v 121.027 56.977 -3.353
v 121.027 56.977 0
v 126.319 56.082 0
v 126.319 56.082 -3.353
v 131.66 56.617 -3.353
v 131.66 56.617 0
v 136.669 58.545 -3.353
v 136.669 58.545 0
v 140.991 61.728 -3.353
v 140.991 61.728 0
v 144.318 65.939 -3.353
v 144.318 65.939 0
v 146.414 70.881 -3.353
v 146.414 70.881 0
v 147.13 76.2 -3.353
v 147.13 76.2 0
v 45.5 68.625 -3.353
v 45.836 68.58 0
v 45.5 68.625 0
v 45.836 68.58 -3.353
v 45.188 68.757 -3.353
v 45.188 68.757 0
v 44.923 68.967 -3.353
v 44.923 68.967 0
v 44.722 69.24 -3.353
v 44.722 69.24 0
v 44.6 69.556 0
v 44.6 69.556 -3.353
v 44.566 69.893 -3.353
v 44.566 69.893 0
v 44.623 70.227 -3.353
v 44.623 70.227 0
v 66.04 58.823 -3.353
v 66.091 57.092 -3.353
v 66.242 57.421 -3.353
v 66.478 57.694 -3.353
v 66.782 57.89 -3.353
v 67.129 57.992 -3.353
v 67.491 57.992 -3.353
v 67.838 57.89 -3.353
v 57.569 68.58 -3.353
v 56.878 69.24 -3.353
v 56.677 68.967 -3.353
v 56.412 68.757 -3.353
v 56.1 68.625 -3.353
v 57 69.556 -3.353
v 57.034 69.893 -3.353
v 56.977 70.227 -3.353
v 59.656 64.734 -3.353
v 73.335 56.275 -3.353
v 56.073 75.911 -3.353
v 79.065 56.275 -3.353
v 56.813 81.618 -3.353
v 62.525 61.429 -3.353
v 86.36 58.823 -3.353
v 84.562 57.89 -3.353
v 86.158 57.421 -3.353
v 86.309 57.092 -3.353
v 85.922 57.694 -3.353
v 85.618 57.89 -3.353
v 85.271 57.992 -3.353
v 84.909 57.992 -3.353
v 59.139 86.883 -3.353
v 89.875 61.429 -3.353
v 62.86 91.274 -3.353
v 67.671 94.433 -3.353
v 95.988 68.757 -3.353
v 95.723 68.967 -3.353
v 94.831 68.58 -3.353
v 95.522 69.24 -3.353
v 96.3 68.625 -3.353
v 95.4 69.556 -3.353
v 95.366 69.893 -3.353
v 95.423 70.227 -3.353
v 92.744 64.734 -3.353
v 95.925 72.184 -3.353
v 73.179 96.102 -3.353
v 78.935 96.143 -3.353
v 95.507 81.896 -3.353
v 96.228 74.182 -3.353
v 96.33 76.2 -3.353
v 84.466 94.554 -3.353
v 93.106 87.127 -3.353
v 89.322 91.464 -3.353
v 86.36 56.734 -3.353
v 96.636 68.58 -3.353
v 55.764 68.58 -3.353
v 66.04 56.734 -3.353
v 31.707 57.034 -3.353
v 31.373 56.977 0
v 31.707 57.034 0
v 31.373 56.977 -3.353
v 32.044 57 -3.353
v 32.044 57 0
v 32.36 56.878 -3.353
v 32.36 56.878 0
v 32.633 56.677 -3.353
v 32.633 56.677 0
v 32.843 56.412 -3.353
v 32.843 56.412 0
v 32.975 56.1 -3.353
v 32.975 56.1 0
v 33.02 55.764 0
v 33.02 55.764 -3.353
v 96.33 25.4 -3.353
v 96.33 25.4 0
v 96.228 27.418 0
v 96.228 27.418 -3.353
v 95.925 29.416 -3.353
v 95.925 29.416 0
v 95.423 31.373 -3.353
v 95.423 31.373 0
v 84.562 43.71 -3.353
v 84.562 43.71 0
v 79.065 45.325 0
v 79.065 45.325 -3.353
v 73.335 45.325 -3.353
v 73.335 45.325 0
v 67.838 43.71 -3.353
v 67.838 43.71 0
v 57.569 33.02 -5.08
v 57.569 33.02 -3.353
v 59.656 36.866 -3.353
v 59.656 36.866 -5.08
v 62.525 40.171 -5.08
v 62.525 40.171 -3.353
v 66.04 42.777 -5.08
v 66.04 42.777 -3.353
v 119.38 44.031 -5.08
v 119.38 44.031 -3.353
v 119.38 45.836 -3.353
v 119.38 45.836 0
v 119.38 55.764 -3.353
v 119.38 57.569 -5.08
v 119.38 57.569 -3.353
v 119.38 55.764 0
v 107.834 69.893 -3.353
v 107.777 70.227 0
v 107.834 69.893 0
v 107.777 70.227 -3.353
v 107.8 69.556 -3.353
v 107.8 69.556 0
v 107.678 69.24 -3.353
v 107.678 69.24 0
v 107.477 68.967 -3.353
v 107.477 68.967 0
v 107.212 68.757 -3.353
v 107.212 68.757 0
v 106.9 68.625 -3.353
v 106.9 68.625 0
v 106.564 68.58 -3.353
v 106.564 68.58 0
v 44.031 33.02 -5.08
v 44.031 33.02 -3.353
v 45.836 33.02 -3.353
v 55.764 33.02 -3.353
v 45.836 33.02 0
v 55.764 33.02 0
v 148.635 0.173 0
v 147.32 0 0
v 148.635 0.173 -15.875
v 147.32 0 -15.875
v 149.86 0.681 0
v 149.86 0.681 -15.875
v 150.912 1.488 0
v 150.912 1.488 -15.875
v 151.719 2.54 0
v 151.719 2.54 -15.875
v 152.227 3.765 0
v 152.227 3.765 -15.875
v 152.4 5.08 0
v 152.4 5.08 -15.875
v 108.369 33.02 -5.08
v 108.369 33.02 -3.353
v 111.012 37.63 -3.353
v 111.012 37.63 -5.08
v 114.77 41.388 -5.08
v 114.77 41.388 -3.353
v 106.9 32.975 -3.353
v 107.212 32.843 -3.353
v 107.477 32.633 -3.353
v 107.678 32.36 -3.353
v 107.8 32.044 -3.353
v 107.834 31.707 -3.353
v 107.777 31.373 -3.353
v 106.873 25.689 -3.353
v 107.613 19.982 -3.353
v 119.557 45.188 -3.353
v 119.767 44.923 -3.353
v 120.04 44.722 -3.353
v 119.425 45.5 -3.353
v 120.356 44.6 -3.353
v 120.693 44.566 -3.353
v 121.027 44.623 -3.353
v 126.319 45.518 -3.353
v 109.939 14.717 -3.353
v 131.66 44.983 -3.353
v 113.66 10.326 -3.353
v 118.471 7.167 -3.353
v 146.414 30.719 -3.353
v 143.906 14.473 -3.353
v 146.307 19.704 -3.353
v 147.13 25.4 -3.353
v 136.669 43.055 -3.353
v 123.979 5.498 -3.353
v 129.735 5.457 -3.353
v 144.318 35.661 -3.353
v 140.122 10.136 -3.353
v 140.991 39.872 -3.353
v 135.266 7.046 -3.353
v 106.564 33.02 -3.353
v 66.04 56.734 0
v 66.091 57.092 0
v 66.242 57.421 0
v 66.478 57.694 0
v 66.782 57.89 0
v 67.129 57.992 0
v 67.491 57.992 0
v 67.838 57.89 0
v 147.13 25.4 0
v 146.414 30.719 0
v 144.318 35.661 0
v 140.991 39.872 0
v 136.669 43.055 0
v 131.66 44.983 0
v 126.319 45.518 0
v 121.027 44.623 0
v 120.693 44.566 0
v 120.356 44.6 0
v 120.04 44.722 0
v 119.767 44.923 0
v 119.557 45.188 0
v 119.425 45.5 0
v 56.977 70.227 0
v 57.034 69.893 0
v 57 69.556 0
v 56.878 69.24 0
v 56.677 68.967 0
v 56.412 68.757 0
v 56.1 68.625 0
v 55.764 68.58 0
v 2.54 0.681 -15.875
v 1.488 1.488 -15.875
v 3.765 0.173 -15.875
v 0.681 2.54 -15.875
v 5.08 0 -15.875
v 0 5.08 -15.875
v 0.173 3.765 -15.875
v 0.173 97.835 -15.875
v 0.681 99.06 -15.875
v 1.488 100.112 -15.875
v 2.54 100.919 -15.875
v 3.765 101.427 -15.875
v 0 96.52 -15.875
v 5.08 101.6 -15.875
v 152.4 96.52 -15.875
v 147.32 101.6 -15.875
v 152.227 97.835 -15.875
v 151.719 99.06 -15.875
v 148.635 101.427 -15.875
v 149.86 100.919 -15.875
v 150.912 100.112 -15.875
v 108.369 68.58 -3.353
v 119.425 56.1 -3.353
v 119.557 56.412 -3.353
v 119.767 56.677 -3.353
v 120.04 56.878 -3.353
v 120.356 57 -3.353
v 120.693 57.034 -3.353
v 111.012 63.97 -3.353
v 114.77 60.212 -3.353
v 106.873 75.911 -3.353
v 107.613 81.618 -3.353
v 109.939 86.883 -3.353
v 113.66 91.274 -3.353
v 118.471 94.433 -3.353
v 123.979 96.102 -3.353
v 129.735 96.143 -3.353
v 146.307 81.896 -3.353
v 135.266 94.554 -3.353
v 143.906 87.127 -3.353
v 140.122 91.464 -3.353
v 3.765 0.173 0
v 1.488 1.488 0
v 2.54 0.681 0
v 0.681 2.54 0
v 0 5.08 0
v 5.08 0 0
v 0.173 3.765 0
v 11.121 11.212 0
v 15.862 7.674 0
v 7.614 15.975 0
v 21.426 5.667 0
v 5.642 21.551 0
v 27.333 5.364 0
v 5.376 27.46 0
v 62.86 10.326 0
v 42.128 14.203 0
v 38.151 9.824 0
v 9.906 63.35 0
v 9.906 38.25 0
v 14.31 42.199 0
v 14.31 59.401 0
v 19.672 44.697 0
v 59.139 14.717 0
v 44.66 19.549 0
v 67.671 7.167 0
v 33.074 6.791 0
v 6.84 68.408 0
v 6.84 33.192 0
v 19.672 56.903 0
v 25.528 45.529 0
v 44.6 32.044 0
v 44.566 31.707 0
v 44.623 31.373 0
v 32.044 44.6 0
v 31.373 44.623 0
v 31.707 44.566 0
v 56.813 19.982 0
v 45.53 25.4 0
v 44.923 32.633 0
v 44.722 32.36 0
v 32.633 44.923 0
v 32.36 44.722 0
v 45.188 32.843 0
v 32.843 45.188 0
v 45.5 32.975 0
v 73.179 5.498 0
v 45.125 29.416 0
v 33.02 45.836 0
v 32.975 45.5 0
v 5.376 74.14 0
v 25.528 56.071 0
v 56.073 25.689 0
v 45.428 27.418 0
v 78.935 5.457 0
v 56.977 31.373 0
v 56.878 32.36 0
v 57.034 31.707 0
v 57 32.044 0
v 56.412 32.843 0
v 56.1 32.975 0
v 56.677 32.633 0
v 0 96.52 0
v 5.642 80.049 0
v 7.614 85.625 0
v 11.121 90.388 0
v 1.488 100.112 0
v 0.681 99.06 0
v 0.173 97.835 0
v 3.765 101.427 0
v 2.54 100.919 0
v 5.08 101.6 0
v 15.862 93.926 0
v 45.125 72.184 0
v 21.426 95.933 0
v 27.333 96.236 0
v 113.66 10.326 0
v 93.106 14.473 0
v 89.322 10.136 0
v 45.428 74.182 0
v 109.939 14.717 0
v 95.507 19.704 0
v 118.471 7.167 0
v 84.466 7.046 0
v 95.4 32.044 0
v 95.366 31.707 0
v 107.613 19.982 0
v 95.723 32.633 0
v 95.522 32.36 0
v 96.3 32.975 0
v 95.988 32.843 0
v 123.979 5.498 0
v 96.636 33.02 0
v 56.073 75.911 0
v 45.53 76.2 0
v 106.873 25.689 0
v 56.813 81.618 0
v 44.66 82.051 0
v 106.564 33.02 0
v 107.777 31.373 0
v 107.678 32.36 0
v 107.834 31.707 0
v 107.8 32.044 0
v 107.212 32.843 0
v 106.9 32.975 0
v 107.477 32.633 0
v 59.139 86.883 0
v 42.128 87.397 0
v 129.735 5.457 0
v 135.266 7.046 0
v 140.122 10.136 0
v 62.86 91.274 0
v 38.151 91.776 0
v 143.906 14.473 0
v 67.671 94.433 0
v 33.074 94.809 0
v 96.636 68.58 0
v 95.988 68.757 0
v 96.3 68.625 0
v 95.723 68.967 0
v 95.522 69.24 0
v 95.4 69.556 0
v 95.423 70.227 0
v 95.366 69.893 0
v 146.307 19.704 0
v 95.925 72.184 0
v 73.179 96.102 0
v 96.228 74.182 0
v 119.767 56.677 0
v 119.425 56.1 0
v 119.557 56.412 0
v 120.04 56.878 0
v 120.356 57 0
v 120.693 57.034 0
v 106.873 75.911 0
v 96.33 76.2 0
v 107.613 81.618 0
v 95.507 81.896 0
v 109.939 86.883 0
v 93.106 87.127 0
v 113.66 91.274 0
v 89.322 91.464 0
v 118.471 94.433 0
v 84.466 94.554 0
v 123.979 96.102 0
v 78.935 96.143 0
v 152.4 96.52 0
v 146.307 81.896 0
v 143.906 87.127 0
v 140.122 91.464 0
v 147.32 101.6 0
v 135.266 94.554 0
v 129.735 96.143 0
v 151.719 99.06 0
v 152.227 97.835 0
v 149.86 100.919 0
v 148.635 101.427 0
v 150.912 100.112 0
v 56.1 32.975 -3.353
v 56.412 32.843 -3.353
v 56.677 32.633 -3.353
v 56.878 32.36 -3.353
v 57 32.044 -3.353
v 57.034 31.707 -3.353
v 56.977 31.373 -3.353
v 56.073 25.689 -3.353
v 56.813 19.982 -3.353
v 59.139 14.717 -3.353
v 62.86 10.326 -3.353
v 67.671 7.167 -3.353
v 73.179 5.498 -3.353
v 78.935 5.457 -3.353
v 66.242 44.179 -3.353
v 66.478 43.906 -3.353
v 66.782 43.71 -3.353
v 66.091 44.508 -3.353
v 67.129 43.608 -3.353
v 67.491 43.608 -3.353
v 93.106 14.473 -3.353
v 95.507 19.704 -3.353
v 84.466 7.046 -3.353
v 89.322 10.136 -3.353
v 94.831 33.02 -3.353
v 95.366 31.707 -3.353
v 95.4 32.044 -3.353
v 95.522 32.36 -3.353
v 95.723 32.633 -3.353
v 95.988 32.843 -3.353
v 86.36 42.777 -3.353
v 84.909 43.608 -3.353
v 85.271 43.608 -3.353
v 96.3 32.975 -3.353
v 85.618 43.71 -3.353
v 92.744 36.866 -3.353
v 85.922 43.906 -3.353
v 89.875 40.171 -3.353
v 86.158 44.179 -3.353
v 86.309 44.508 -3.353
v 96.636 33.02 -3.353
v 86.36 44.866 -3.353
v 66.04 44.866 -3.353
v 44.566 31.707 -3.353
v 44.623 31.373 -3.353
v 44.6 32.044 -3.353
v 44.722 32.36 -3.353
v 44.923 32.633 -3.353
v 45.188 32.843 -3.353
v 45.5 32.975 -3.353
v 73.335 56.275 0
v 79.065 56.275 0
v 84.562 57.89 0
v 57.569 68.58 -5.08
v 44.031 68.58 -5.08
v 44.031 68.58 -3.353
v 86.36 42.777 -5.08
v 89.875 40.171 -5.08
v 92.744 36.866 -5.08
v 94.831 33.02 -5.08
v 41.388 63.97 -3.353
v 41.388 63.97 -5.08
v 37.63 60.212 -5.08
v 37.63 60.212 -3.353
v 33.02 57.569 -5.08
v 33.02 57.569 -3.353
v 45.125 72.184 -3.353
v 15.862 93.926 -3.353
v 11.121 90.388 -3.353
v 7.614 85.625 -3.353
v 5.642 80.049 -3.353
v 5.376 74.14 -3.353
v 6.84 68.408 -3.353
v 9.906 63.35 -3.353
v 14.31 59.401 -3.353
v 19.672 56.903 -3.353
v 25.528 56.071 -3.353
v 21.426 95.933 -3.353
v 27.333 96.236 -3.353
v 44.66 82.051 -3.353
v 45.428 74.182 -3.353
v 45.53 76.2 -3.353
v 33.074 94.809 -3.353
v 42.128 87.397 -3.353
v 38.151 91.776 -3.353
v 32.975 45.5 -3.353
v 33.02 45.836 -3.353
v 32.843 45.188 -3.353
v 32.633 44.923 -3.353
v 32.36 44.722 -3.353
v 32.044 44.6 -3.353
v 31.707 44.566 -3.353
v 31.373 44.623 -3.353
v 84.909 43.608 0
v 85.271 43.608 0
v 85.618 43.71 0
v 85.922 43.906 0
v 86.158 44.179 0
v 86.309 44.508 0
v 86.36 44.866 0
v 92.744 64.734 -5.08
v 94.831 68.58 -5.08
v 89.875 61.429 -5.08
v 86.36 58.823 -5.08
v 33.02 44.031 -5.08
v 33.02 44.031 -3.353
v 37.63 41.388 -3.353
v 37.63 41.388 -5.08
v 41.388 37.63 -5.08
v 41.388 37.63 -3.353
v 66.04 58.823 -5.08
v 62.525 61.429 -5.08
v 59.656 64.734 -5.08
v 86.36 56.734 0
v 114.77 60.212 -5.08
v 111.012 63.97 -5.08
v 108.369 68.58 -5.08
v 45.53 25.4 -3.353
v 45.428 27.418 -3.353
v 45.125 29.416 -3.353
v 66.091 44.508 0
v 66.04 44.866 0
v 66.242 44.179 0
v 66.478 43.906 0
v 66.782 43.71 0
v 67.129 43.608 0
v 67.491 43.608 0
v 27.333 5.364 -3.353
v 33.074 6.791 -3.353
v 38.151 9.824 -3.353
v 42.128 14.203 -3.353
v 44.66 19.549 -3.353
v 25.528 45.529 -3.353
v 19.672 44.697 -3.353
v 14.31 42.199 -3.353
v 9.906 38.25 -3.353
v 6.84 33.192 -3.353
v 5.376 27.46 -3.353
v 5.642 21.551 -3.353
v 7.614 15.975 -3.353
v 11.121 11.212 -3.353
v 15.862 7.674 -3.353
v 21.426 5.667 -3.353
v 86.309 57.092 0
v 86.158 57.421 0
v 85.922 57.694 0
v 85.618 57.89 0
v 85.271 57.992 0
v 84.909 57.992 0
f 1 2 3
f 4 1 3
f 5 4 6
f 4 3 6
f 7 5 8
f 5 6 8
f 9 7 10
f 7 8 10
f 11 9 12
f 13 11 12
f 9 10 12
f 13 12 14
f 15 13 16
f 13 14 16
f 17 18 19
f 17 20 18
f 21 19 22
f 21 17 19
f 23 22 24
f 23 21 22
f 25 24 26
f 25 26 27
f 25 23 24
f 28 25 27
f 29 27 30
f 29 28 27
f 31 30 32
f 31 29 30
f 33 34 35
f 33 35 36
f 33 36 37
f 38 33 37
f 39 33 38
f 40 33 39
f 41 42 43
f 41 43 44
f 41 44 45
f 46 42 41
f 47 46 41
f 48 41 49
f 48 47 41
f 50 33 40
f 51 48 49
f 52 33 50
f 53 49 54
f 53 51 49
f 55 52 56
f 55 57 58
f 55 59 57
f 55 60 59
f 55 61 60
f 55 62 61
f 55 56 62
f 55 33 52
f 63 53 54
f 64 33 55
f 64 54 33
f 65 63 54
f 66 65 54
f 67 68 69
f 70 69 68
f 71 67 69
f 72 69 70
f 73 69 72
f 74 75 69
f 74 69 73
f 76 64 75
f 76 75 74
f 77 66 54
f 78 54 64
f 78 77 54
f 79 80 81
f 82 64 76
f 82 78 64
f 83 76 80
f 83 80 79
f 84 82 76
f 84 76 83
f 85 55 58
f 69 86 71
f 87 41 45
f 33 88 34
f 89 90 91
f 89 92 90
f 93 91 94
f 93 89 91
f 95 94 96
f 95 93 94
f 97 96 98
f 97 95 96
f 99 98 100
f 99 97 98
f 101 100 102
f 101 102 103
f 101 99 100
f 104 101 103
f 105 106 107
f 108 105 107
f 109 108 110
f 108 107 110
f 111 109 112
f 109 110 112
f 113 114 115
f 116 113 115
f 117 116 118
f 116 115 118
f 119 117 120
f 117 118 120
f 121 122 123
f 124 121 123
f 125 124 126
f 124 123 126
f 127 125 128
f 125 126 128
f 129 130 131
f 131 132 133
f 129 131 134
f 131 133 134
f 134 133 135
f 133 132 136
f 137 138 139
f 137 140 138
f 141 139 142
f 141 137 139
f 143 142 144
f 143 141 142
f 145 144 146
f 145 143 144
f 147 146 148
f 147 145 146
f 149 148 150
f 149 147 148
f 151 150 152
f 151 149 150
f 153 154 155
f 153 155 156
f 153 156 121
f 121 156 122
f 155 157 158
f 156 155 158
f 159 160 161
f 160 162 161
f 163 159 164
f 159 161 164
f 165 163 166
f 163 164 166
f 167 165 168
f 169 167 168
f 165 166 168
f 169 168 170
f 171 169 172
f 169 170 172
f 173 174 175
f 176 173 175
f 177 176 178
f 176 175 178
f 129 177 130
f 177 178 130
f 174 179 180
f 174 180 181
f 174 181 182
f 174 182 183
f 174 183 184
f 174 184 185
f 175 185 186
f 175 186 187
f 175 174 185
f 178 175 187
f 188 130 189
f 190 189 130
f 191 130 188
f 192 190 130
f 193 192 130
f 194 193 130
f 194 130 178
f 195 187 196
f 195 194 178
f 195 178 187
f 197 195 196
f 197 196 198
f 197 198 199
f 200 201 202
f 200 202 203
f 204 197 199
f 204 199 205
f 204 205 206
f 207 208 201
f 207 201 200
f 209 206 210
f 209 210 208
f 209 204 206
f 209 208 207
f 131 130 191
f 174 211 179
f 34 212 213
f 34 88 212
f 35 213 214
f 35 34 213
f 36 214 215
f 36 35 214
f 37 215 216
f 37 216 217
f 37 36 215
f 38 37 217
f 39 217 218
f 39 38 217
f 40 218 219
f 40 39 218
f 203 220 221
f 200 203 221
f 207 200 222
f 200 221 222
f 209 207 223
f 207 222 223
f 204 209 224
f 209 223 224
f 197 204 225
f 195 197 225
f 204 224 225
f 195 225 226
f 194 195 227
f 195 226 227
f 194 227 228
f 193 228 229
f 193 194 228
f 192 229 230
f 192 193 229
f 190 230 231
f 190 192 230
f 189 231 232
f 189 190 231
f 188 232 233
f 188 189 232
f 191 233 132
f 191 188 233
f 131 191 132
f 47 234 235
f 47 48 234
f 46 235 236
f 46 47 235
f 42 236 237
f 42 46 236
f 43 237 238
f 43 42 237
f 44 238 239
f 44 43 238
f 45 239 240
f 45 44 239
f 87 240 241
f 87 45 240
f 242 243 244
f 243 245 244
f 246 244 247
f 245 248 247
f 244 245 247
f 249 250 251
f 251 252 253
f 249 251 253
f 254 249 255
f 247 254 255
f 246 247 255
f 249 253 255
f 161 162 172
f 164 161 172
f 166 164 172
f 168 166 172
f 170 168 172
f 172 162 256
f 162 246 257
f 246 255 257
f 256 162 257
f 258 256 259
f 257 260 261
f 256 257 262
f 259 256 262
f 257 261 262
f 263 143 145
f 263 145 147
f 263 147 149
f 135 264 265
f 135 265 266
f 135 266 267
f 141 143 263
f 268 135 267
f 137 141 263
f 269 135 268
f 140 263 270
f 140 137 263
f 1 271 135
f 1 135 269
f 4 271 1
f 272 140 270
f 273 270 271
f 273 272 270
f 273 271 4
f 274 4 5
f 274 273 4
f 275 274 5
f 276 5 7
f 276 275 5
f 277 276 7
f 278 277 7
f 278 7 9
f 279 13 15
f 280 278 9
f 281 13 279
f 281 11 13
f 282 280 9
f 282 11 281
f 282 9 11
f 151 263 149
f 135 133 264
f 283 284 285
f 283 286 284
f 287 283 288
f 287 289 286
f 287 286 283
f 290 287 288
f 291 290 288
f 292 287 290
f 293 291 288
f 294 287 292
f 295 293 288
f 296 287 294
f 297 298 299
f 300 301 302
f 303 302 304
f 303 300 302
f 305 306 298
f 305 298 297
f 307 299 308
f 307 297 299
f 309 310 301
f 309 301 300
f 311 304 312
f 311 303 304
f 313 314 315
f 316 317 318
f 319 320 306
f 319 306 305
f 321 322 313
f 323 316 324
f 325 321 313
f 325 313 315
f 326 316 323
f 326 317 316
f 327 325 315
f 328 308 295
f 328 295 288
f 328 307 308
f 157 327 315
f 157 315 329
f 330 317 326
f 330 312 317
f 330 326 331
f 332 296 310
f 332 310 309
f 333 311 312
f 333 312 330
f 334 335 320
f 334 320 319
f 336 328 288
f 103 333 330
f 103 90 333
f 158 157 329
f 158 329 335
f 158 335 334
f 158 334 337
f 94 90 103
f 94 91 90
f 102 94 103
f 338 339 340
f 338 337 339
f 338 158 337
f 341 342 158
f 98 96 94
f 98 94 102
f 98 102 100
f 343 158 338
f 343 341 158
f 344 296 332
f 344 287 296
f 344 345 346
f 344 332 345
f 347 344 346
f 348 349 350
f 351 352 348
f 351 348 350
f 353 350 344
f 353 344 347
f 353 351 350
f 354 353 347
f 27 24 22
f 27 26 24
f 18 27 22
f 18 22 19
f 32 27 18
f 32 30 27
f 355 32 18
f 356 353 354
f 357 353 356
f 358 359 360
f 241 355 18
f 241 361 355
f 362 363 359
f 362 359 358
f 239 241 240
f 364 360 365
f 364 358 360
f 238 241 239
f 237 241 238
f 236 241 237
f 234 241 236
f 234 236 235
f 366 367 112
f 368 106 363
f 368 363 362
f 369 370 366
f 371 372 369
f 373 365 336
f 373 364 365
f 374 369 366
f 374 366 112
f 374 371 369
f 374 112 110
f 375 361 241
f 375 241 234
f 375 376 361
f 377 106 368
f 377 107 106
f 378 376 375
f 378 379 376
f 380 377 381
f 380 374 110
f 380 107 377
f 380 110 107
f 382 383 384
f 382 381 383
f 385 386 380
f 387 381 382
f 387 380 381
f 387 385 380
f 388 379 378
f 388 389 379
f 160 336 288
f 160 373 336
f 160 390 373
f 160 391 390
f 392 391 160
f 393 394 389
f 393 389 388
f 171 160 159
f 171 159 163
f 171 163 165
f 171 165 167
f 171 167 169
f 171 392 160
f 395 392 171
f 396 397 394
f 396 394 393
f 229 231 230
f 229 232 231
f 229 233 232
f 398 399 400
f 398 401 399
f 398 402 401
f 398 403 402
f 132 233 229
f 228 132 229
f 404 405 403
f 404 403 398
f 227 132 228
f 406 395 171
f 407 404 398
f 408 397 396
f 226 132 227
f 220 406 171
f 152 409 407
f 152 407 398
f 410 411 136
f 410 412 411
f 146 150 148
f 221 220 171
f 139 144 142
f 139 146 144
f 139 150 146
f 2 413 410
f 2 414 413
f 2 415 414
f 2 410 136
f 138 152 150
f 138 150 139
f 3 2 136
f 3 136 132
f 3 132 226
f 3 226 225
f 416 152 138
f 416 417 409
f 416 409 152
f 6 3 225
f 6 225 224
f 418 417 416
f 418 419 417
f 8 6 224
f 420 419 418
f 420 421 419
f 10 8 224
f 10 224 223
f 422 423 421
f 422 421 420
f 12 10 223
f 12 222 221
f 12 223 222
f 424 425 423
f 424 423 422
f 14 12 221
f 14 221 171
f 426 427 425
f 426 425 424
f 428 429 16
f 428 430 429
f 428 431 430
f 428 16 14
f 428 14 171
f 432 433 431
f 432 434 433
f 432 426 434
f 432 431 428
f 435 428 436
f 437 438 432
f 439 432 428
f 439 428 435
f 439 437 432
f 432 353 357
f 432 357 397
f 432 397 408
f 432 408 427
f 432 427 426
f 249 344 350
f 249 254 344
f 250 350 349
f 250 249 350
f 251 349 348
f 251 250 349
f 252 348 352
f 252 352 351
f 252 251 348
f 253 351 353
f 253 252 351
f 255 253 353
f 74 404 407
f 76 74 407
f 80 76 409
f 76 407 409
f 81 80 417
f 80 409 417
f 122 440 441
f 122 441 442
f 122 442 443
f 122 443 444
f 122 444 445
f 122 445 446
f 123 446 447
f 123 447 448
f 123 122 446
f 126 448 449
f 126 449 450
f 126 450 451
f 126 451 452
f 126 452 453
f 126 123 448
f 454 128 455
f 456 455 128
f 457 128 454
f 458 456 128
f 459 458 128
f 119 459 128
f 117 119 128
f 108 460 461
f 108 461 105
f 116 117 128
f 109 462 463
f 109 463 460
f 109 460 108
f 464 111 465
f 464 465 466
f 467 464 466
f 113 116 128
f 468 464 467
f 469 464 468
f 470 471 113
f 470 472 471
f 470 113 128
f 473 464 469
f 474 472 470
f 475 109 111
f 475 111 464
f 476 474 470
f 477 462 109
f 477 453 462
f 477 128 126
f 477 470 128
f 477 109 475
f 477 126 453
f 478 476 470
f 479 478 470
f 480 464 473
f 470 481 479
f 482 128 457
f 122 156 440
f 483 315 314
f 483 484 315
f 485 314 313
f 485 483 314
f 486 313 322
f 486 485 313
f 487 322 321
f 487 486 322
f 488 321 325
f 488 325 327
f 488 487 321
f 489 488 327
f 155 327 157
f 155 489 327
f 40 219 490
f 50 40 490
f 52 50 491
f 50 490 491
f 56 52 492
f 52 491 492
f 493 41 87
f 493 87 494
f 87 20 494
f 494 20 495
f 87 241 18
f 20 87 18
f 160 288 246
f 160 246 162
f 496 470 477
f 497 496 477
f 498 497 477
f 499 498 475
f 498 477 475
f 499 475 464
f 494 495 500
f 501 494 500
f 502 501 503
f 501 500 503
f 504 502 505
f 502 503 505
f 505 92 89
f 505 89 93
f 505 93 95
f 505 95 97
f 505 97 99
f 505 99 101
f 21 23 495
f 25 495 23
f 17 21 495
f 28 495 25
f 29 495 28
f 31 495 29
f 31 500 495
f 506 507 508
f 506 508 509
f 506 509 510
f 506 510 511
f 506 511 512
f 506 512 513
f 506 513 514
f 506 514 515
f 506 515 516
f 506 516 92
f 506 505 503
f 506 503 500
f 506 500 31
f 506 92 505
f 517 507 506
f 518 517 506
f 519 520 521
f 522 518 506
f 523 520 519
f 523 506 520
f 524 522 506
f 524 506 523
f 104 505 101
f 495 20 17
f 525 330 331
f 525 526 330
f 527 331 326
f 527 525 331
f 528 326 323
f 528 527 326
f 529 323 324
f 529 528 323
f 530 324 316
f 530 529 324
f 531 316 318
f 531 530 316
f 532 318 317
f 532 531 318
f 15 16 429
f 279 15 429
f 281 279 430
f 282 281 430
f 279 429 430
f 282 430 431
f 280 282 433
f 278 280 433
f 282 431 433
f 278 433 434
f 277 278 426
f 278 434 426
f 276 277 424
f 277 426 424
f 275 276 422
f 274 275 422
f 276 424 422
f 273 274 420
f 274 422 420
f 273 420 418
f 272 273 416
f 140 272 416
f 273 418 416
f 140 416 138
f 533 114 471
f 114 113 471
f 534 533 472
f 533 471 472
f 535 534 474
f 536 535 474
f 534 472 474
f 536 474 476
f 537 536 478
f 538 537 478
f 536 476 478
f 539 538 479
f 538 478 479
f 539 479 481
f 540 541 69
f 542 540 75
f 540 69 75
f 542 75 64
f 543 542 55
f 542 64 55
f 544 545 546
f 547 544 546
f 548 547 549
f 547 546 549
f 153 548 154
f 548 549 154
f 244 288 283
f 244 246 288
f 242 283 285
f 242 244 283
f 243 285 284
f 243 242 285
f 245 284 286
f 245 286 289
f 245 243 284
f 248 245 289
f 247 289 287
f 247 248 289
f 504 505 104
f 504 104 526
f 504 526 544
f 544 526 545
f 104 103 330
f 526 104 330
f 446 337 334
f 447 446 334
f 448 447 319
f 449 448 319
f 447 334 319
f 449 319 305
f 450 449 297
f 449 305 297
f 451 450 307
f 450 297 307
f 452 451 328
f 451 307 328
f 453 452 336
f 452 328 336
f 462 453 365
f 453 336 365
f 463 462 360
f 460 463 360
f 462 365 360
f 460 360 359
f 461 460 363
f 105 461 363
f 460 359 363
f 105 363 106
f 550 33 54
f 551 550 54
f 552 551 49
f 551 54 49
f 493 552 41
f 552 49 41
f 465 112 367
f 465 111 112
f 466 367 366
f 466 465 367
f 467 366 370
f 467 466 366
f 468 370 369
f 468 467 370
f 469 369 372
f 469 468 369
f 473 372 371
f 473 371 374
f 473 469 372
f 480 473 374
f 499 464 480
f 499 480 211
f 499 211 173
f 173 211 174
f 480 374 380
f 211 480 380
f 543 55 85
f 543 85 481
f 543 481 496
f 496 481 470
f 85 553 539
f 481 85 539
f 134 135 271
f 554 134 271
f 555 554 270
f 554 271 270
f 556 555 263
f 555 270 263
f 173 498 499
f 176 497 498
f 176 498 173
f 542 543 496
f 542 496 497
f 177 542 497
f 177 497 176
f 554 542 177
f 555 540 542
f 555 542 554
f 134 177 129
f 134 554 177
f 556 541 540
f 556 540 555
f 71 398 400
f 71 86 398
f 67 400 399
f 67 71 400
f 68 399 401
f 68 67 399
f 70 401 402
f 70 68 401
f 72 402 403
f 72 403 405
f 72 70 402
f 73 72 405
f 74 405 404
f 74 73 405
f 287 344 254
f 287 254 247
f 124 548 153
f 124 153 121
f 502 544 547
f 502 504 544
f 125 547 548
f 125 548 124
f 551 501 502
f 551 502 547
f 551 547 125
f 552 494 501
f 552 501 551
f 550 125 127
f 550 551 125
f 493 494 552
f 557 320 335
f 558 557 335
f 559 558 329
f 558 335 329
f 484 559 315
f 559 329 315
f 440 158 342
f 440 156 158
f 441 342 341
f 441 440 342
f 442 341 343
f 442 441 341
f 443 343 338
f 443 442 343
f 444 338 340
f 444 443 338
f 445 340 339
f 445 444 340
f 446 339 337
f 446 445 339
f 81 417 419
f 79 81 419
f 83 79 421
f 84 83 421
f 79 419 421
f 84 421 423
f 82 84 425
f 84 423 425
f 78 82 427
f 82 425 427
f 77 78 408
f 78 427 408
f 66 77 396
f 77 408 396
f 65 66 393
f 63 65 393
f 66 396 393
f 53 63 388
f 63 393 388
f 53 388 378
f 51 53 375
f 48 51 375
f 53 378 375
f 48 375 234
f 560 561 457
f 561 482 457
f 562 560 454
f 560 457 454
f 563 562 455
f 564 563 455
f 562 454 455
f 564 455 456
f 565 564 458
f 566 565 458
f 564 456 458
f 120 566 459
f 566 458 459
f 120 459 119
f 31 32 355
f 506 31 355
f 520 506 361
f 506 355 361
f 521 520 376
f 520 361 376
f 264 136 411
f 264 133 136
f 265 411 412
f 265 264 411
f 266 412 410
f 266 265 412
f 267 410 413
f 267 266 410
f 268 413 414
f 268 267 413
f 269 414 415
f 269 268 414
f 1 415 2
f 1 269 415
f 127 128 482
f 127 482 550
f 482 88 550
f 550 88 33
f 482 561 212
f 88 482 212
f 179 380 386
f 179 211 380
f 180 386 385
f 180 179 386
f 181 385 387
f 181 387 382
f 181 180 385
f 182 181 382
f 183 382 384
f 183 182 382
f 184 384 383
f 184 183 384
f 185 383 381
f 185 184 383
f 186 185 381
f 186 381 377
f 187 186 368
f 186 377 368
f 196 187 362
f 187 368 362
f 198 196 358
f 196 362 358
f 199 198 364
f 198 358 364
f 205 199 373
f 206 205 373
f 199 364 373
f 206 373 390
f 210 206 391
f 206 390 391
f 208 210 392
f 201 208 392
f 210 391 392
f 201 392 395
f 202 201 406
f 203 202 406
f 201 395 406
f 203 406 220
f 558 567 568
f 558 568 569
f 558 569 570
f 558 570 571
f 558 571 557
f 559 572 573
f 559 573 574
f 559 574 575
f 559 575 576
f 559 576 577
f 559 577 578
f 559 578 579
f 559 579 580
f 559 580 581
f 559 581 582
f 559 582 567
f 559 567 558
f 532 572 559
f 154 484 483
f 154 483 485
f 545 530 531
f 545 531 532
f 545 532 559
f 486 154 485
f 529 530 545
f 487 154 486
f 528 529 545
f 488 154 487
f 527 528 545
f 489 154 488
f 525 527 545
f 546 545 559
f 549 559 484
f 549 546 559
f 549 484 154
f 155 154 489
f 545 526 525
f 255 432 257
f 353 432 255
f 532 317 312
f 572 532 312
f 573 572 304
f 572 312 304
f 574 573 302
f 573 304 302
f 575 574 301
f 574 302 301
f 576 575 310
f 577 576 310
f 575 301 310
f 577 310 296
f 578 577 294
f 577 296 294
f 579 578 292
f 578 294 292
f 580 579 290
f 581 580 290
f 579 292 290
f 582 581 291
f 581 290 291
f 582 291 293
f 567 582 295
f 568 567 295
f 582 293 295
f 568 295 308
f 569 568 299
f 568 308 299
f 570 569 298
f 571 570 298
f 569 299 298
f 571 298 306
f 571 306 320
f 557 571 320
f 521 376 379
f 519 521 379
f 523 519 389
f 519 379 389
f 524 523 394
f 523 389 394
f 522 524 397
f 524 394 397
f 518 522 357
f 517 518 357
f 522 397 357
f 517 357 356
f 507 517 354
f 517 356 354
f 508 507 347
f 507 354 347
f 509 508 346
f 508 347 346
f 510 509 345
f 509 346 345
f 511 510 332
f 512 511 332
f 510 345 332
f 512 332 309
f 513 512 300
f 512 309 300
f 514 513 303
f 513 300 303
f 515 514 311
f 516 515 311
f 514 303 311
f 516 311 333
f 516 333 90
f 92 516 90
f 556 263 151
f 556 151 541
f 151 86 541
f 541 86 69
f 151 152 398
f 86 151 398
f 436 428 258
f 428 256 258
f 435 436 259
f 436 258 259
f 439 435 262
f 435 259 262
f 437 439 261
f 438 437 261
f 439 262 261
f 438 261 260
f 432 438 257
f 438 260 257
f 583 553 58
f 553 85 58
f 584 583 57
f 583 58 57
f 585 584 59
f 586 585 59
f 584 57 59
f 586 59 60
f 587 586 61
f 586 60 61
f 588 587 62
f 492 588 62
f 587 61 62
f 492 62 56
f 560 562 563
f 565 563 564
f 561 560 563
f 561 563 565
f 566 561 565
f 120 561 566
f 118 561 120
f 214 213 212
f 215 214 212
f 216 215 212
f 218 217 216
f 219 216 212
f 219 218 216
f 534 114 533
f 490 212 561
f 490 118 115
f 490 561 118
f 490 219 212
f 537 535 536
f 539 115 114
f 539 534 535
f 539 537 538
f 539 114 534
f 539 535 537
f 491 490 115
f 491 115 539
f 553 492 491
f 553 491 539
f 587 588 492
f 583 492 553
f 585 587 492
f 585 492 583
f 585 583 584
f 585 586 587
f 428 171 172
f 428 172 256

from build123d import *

# Parameters (mm, degrees)
F1_DEPTH = 15.875
F2_DEPTH = 3.3528
F3_DEPTH = 5.08
F4_R     = 5.08
F5_R     = 1.27


with BuildPart() as f1:
    # F0 (on Top) → F1 (new body)
    with BuildSketch(Plane.XY):
        Polygon((0, 25.4), (0, 0), (33.02, 0), (66.04, 0), (76.2, 0), (86.36, 0), (119.38, 0), (152.4, 0), (152.4, 33.02), (152.4, 68.58), (152.4, 101.6), (127, 101.6), (76.2, 101.6), (25.4, 101.6), (0, 101.6), (0, 76.2), align=None)
        with BuildLine():
            ThreePointArc((44.0314886751, 33.02), (45.151447055, 29.2829253769), (45.5295, 25.4))
            ThreePointArc((45.5295, 25.4), (8.6879749843, 14.179260714), (33.02, 44.0314886751))
            Line((33.02, 44.0314886751), (33.02, 57.5685113249))
            ThreePointArc((33.02, 57.5685113249), (8.6879749843, 87.420739286), (45.5295, 76.2))
            ThreePointArc((45.5295, 76.2), (45.151447055, 72.3170746231), (44.0314886751, 68.58))
            Line((44.0314886751, 68.58), (57.5685113249, 68.58))
            ThreePointArc((57.5685113249, 68.58), (72.3170746231, 95.951447055), (96.3295, 76.2))
            ThreePointArc((96.3295, 76.2), (95.951447055, 72.3170746231), (94.8314886751, 68.58))
            Line((94.8314886751, 68.58), (108.3685113249, 68.58))
            ThreePointArc((108.3685113249, 68.58), (123.1170746231, 95.951447055), (147.1295, 76.2))
            ThreePointArc((147.1295, 76.2), (138.220739286, 59.4879749843), (119.38, 57.5685113249))
            Line((119.38, 57.5685113249), (119.38, 44.0314886751))
            ThreePointArc((119.38, 44.0314886751), (138.220739286, 42.1120250157), (147.1295, 25.4))
            ThreePointArc((147.1295, 25.4), (123.1170746231, 5.648552945), (108.3685113249, 33.02))
            Line((108.3685113249, 33.02), (94.8314886751, 33.02))
            ThreePointArc((94.8314886751, 33.02), (95.951447055, 29.2829253769), (96.3295, 25.4))
            ThreePointArc((96.3295, 25.4), (72.3170746231, 5.648552945), (57.5685113249, 33.02))
            Line((57.5685113249, 33.02), (44.0314886751, 33.02))
        make_face(mode=Mode.SUBTRACT)
        with BuildLine():
            ThreePointArc((45.5295, 76.2), (8.6879749843, 87.420739286), (33.02, 57.5685113249))
            ThreePointArc((33.02, 57.5685113249), (39.6337059519, 61.9662940481), (44.0314886751, 68.58))
            ThreePointArc((44.0314886751, 68.58), (45.151447055, 72.3170746231), (45.5295, 76.2))
        make_face()
        with BuildLine():
            ThreePointArc((33.02, 44.0314886751), (8.6879749843, 14.179260714), (45.5295, 25.4))
            ThreePointArc((45.5295, 25.4), (45.151447055, 29.2829253769), (44.0314886751, 33.02))
            ThreePointArc((44.0314886751, 33.02), (39.6337059519, 39.6337059519), (33.02, 44.0314886751))
        make_face()
        with BuildLine():
            ThreePointArc((66.04, 42.7773176943), (61.0000405534, 38.5968936902), (57.5685113249, 33.02))
            ThreePointArc((57.5685113249, 33.02), (72.3170746231, 5.648552945), (96.3295, 25.4))
            ThreePointArc((96.3295, 25.4), (95.951447055, 29.2829253769), (94.8314886751, 33.02))
            ThreePointArc((94.8314886751, 33.02), (91.3999594466, 38.5968936902), (86.36, 42.7773176943))
            ThreePointArc((86.36, 42.7773176943), (76.2, 45.5295), (66.04, 42.7773176943))
        make_face()
        with BuildLine():
            ThreePointArc((147.1295, 76.2), (123.1170746231, 95.951447055), (108.3685113249, 68.58))
            ThreePointArc((108.3685113249, 68.58), (112.7662940481, 61.9662940481), (119.38, 57.5685113249))
            ThreePointArc((119.38, 57.5685113249), (138.220739286, 59.4879749843), (147.1295, 76.2))
        make_face()
        with BuildLine():
            ThreePointArc((57.5685113249, 68.58), (61.0000405534, 63.0031063098), (66.04, 58.8226823057))
            ThreePointArc((66.04, 58.8226823057), (76.2, 56.0705), (86.36, 58.8226823057))
            ThreePointArc((86.36, 58.8226823057), (91.3999594466, 63.0031063098), (94.8314886751, 68.58))
            ThreePointArc((94.8314886751, 68.58), (95.951447055, 72.3170746231), (96.3295, 76.2))
            ThreePointArc((96.3295, 76.2), (72.3170746231, 95.951447055), (57.5685113249, 68.58))
        make_face()
        with BuildLine():
            ThreePointArc((119.38, 44.0314886751), (112.7662940481, 39.6337059519), (108.3685113249, 33.02))
            ThreePointArc((108.3685113249, 33.02), (123.1170746231, 5.648552945), (147.1295, 25.4))
            ThreePointArc((147.1295, 25.4), (138.220739286, 42.1120250157), (119.38, 44.0314886751))
        make_face()
        with BuildLine():
            ThreePointArc((33.02, 44.0314886751), (39.6337059519, 39.6337059519), (44.0314886751, 33.02))
            Line((44.0314886751, 33.02), (57.5685113249, 33.02))
            ThreePointArc((57.5685113249, 33.02), (61.0000405534, 38.5968936902), (66.04, 42.7773176943))
            Line((66.04, 42.7773176943), (66.04, 58.8226823057))
            ThreePointArc((66.04, 58.8226823057), (61.0000405534, 63.0031063098), (57.5685113249, 68.58))
            Line((57.5685113249, 68.58), (44.0314886751, 68.58))
            ThreePointArc((44.0314886751, 68.58), (39.6337059519, 61.9662940481), (33.02, 57.5685113249))
            Line((33.02, 57.5685113249), (33.02, 44.0314886751))
        make_face()
        with BuildLine():
            Line((86.36, 58.8226823057), (86.36, 42.7773176943))
            ThreePointArc((86.36, 42.7773176943), (91.3999594466, 38.5968936902), (94.8314886751, 33.02))
            Line((94.8314886751, 33.02), (108.3685113249, 33.02))
            ThreePointArc((108.3685113249, 33.02), (112.7662940481, 39.6337059519), (119.38, 44.0314886751))
            Line((119.38, 44.0314886751), (119.38, 57.5685113249))
            ThreePointArc((119.38, 57.5685113249), (112.7662940481, 61.9662940481), (108.3685113249, 68.58))
            Line((108.3685113249, 68.58), (94.8314886751, 68.58))
            ThreePointArc((94.8314886751, 68.58), (91.3999594466, 63.0031063098), (86.36, 58.8226823057))
        make_face()
        with BuildLine():
            Line((66.04, 58.8226823057), (66.04, 42.7773176943))
            ThreePointArc((66.04, 42.7773176943), (76.2, 45.5295), (86.36, 42.7773176943))
            Line((86.36, 42.7773176943), (86.36, 58.8226823057))
            ThreePointArc((86.36, 58.8226823057), (76.2, 56.0705), (66.04, 58.8226823057))
        make_face()
    extrude(amount=-F1_DEPTH)

    # F0 (on Top) → F2 (cut)
    with BuildSketch(Plane.XY):
        with BuildLine():
            ThreePointArc((45.5295, 76.2), (8.6879749843, 87.420739286), (33.02, 57.5685113249))
            ThreePointArc((33.02, 57.5685113249), (39.6337059519, 61.9662940481), (44.0314886751, 68.58))
            ThreePointArc((44.0314886751, 68.58), (45.151447055, 72.3170746231), (45.5295, 76.2))
        make_face()
        with BuildLine():
            ThreePointArc((33.02, 44.0314886751), (8.6879749843, 14.179260714), (45.5295, 25.4))
            ThreePointArc((45.5295, 25.4), (45.151447055, 29.2829253769), (44.0314886751, 33.02))
            ThreePointArc((44.0314886751, 33.02), (39.6337059519, 39.6337059519), (33.02, 44.0314886751))
        make_face()
        with BuildLine():
            ThreePointArc((66.04, 42.7773176943), (61.0000405534, 38.5968936902), (57.5685113249, 33.02))
            ThreePointArc((57.5685113249, 33.02), (72.3170746231, 5.648552945), (96.3295, 25.4))
            ThreePointArc((96.3295, 25.4), (95.951447055, 29.2829253769), (94.8314886751, 33.02))
            ThreePointArc((94.8314886751, 33.02), (91.3999594466, 38.5968936902), (86.36, 42.7773176943))
            ThreePointArc((86.36, 42.7773176943), (76.2, 45.5295), (66.04, 42.7773176943))
        make_face()
        with BuildLine():
            ThreePointArc((57.5685113249, 68.58), (61.0000405534, 63.0031063098), (66.04, 58.8226823057))
            ThreePointArc((66.04, 58.8226823057), (76.2, 56.0705), (86.36, 58.8226823057))
            ThreePointArc((86.36, 58.8226823057), (91.3999594466, 63.0031063098), (94.8314886751, 68.58))
            ThreePointArc((94.8314886751, 68.58), (95.951447055, 72.3170746231), (96.3295, 76.2))
            ThreePointArc((96.3295, 76.2), (72.3170746231, 95.951447055), (57.5685113249, 68.58))
        make_face()
        with BuildLine():
            ThreePointArc((147.1295, 76.2), (123.1170746231, 95.951447055), (108.3685113249, 68.58))
            ThreePointArc((108.3685113249, 68.58), (112.7662940481, 61.9662940481), (119.38, 57.5685113249))
            ThreePointArc((119.38, 57.5685113249), (138.220739286, 59.4879749843), (147.1295, 76.2))
        make_face()
        with BuildLine():
            ThreePointArc((119.38, 44.0314886751), (112.7662940481, 39.6337059519), (108.3685113249, 33.02))
            ThreePointArc((108.3685113249, 33.02), (123.1170746231, 5.648552945), (147.1295, 25.4))
            ThreePointArc((147.1295, 25.4), (138.220739286, 42.1120250157), (119.38, 44.0314886751))
        make_face()
    extrude(amount=-F2_DEPTH, mode=Mode.SUBTRACT)

    # F0 (on Top) → F3 (cut)
    with BuildSketch(Plane.XY):
        with BuildLine():
            ThreePointArc((33.02, 44.0314886751), (39.6337059519, 39.6337059519), (44.0314886751, 33.02))
            Line((44.0314886751, 33.02), (57.5685113249, 33.02))
            ThreePointArc((57.5685113249, 33.02), (61.0000405534, 38.5968936902), (66.04, 42.7773176943))
            Line((66.04, 42.7773176943), (66.04, 58.8226823057))
            ThreePointArc((66.04, 58.8226823057), (61.0000405534, 63.0031063098), (57.5685113249, 68.58))
            Line((57.5685113249, 68.58), (44.0314886751, 68.58))
            ThreePointArc((44.0314886751, 68.58), (39.6337059519, 61.9662940481), (33.02, 57.5685113249))
            Line((33.02, 57.5685113249), (33.02, 44.0314886751))
        make_face()
        with BuildLine():
            Line((86.36, 58.8226823057), (86.36, 42.7773176943))
            ThreePointArc((86.36, 42.7773176943), (91.3999594466, 38.5968936902), (94.8314886751, 33.02))
            Line((94.8314886751, 33.02), (108.3685113249, 33.02))
            ThreePointArc((108.3685113249, 33.02), (112.7662940481, 39.6337059519), (119.38, 44.0314886751))
            Line((119.38, 44.0314886751), (119.38, 57.5685113249))
            ThreePointArc((119.38, 57.5685113249), (112.7662940481, 61.9662940481), (108.3685113249, 68.58))
            Line((108.3685113249, 68.58), (94.8314886751, 68.58))
            ThreePointArc((94.8314886751, 68.58), (91.3999594466, 63.0031063098), (86.36, 58.8226823057))
        make_face()
    extrude(amount=-F3_DEPTH, mode=Mode.SUBTRACT)

    # F4
    f4_edges = [f1.edges().sort_by_distance(p)[0] for p in [
        (0, 0, -7.9375),
        (152.4, 0, -7.9375),
        (152.4, 101.6, -7.9375),
        (0, 101.6, -7.9375),
    ]]
    fillet(f4_edges, radius=F4_R)

    # F5
    f5_edges = [f1.edges().sort_by_distance(p)[0] for p in [
        (86.36, 58.822682, -1.6764),
        (94.831489, 68.58, -1.6764),
        (108.368511, 68.58, -1.6764),
        (119.38, 57.568511, -1.6764),
        (119.38, 44.031489, -1.6764),
        (108.368511, 33.02, -1.6764),
        (94.831489, 33.02, -1.6764),
        (86.36, 42.777318, -1.6764),
        (66.04, 42.777318, -1.6764),
        (57.568511, 33.02, -1.6764),
        (44.031489, 33.02, -1.6764),
        (33.02, 44.031489, -1.6764),
        (33.02, 57.568511, -1.6764),
        (44.031489, 68.58, -1.6764),
        (57.568511, 68.58, -1.6764),
        (66.04, 58.822682, -1.6764),
    ]]
    fillet(f5_edges, radius=F5_R)


solid = f1.part
